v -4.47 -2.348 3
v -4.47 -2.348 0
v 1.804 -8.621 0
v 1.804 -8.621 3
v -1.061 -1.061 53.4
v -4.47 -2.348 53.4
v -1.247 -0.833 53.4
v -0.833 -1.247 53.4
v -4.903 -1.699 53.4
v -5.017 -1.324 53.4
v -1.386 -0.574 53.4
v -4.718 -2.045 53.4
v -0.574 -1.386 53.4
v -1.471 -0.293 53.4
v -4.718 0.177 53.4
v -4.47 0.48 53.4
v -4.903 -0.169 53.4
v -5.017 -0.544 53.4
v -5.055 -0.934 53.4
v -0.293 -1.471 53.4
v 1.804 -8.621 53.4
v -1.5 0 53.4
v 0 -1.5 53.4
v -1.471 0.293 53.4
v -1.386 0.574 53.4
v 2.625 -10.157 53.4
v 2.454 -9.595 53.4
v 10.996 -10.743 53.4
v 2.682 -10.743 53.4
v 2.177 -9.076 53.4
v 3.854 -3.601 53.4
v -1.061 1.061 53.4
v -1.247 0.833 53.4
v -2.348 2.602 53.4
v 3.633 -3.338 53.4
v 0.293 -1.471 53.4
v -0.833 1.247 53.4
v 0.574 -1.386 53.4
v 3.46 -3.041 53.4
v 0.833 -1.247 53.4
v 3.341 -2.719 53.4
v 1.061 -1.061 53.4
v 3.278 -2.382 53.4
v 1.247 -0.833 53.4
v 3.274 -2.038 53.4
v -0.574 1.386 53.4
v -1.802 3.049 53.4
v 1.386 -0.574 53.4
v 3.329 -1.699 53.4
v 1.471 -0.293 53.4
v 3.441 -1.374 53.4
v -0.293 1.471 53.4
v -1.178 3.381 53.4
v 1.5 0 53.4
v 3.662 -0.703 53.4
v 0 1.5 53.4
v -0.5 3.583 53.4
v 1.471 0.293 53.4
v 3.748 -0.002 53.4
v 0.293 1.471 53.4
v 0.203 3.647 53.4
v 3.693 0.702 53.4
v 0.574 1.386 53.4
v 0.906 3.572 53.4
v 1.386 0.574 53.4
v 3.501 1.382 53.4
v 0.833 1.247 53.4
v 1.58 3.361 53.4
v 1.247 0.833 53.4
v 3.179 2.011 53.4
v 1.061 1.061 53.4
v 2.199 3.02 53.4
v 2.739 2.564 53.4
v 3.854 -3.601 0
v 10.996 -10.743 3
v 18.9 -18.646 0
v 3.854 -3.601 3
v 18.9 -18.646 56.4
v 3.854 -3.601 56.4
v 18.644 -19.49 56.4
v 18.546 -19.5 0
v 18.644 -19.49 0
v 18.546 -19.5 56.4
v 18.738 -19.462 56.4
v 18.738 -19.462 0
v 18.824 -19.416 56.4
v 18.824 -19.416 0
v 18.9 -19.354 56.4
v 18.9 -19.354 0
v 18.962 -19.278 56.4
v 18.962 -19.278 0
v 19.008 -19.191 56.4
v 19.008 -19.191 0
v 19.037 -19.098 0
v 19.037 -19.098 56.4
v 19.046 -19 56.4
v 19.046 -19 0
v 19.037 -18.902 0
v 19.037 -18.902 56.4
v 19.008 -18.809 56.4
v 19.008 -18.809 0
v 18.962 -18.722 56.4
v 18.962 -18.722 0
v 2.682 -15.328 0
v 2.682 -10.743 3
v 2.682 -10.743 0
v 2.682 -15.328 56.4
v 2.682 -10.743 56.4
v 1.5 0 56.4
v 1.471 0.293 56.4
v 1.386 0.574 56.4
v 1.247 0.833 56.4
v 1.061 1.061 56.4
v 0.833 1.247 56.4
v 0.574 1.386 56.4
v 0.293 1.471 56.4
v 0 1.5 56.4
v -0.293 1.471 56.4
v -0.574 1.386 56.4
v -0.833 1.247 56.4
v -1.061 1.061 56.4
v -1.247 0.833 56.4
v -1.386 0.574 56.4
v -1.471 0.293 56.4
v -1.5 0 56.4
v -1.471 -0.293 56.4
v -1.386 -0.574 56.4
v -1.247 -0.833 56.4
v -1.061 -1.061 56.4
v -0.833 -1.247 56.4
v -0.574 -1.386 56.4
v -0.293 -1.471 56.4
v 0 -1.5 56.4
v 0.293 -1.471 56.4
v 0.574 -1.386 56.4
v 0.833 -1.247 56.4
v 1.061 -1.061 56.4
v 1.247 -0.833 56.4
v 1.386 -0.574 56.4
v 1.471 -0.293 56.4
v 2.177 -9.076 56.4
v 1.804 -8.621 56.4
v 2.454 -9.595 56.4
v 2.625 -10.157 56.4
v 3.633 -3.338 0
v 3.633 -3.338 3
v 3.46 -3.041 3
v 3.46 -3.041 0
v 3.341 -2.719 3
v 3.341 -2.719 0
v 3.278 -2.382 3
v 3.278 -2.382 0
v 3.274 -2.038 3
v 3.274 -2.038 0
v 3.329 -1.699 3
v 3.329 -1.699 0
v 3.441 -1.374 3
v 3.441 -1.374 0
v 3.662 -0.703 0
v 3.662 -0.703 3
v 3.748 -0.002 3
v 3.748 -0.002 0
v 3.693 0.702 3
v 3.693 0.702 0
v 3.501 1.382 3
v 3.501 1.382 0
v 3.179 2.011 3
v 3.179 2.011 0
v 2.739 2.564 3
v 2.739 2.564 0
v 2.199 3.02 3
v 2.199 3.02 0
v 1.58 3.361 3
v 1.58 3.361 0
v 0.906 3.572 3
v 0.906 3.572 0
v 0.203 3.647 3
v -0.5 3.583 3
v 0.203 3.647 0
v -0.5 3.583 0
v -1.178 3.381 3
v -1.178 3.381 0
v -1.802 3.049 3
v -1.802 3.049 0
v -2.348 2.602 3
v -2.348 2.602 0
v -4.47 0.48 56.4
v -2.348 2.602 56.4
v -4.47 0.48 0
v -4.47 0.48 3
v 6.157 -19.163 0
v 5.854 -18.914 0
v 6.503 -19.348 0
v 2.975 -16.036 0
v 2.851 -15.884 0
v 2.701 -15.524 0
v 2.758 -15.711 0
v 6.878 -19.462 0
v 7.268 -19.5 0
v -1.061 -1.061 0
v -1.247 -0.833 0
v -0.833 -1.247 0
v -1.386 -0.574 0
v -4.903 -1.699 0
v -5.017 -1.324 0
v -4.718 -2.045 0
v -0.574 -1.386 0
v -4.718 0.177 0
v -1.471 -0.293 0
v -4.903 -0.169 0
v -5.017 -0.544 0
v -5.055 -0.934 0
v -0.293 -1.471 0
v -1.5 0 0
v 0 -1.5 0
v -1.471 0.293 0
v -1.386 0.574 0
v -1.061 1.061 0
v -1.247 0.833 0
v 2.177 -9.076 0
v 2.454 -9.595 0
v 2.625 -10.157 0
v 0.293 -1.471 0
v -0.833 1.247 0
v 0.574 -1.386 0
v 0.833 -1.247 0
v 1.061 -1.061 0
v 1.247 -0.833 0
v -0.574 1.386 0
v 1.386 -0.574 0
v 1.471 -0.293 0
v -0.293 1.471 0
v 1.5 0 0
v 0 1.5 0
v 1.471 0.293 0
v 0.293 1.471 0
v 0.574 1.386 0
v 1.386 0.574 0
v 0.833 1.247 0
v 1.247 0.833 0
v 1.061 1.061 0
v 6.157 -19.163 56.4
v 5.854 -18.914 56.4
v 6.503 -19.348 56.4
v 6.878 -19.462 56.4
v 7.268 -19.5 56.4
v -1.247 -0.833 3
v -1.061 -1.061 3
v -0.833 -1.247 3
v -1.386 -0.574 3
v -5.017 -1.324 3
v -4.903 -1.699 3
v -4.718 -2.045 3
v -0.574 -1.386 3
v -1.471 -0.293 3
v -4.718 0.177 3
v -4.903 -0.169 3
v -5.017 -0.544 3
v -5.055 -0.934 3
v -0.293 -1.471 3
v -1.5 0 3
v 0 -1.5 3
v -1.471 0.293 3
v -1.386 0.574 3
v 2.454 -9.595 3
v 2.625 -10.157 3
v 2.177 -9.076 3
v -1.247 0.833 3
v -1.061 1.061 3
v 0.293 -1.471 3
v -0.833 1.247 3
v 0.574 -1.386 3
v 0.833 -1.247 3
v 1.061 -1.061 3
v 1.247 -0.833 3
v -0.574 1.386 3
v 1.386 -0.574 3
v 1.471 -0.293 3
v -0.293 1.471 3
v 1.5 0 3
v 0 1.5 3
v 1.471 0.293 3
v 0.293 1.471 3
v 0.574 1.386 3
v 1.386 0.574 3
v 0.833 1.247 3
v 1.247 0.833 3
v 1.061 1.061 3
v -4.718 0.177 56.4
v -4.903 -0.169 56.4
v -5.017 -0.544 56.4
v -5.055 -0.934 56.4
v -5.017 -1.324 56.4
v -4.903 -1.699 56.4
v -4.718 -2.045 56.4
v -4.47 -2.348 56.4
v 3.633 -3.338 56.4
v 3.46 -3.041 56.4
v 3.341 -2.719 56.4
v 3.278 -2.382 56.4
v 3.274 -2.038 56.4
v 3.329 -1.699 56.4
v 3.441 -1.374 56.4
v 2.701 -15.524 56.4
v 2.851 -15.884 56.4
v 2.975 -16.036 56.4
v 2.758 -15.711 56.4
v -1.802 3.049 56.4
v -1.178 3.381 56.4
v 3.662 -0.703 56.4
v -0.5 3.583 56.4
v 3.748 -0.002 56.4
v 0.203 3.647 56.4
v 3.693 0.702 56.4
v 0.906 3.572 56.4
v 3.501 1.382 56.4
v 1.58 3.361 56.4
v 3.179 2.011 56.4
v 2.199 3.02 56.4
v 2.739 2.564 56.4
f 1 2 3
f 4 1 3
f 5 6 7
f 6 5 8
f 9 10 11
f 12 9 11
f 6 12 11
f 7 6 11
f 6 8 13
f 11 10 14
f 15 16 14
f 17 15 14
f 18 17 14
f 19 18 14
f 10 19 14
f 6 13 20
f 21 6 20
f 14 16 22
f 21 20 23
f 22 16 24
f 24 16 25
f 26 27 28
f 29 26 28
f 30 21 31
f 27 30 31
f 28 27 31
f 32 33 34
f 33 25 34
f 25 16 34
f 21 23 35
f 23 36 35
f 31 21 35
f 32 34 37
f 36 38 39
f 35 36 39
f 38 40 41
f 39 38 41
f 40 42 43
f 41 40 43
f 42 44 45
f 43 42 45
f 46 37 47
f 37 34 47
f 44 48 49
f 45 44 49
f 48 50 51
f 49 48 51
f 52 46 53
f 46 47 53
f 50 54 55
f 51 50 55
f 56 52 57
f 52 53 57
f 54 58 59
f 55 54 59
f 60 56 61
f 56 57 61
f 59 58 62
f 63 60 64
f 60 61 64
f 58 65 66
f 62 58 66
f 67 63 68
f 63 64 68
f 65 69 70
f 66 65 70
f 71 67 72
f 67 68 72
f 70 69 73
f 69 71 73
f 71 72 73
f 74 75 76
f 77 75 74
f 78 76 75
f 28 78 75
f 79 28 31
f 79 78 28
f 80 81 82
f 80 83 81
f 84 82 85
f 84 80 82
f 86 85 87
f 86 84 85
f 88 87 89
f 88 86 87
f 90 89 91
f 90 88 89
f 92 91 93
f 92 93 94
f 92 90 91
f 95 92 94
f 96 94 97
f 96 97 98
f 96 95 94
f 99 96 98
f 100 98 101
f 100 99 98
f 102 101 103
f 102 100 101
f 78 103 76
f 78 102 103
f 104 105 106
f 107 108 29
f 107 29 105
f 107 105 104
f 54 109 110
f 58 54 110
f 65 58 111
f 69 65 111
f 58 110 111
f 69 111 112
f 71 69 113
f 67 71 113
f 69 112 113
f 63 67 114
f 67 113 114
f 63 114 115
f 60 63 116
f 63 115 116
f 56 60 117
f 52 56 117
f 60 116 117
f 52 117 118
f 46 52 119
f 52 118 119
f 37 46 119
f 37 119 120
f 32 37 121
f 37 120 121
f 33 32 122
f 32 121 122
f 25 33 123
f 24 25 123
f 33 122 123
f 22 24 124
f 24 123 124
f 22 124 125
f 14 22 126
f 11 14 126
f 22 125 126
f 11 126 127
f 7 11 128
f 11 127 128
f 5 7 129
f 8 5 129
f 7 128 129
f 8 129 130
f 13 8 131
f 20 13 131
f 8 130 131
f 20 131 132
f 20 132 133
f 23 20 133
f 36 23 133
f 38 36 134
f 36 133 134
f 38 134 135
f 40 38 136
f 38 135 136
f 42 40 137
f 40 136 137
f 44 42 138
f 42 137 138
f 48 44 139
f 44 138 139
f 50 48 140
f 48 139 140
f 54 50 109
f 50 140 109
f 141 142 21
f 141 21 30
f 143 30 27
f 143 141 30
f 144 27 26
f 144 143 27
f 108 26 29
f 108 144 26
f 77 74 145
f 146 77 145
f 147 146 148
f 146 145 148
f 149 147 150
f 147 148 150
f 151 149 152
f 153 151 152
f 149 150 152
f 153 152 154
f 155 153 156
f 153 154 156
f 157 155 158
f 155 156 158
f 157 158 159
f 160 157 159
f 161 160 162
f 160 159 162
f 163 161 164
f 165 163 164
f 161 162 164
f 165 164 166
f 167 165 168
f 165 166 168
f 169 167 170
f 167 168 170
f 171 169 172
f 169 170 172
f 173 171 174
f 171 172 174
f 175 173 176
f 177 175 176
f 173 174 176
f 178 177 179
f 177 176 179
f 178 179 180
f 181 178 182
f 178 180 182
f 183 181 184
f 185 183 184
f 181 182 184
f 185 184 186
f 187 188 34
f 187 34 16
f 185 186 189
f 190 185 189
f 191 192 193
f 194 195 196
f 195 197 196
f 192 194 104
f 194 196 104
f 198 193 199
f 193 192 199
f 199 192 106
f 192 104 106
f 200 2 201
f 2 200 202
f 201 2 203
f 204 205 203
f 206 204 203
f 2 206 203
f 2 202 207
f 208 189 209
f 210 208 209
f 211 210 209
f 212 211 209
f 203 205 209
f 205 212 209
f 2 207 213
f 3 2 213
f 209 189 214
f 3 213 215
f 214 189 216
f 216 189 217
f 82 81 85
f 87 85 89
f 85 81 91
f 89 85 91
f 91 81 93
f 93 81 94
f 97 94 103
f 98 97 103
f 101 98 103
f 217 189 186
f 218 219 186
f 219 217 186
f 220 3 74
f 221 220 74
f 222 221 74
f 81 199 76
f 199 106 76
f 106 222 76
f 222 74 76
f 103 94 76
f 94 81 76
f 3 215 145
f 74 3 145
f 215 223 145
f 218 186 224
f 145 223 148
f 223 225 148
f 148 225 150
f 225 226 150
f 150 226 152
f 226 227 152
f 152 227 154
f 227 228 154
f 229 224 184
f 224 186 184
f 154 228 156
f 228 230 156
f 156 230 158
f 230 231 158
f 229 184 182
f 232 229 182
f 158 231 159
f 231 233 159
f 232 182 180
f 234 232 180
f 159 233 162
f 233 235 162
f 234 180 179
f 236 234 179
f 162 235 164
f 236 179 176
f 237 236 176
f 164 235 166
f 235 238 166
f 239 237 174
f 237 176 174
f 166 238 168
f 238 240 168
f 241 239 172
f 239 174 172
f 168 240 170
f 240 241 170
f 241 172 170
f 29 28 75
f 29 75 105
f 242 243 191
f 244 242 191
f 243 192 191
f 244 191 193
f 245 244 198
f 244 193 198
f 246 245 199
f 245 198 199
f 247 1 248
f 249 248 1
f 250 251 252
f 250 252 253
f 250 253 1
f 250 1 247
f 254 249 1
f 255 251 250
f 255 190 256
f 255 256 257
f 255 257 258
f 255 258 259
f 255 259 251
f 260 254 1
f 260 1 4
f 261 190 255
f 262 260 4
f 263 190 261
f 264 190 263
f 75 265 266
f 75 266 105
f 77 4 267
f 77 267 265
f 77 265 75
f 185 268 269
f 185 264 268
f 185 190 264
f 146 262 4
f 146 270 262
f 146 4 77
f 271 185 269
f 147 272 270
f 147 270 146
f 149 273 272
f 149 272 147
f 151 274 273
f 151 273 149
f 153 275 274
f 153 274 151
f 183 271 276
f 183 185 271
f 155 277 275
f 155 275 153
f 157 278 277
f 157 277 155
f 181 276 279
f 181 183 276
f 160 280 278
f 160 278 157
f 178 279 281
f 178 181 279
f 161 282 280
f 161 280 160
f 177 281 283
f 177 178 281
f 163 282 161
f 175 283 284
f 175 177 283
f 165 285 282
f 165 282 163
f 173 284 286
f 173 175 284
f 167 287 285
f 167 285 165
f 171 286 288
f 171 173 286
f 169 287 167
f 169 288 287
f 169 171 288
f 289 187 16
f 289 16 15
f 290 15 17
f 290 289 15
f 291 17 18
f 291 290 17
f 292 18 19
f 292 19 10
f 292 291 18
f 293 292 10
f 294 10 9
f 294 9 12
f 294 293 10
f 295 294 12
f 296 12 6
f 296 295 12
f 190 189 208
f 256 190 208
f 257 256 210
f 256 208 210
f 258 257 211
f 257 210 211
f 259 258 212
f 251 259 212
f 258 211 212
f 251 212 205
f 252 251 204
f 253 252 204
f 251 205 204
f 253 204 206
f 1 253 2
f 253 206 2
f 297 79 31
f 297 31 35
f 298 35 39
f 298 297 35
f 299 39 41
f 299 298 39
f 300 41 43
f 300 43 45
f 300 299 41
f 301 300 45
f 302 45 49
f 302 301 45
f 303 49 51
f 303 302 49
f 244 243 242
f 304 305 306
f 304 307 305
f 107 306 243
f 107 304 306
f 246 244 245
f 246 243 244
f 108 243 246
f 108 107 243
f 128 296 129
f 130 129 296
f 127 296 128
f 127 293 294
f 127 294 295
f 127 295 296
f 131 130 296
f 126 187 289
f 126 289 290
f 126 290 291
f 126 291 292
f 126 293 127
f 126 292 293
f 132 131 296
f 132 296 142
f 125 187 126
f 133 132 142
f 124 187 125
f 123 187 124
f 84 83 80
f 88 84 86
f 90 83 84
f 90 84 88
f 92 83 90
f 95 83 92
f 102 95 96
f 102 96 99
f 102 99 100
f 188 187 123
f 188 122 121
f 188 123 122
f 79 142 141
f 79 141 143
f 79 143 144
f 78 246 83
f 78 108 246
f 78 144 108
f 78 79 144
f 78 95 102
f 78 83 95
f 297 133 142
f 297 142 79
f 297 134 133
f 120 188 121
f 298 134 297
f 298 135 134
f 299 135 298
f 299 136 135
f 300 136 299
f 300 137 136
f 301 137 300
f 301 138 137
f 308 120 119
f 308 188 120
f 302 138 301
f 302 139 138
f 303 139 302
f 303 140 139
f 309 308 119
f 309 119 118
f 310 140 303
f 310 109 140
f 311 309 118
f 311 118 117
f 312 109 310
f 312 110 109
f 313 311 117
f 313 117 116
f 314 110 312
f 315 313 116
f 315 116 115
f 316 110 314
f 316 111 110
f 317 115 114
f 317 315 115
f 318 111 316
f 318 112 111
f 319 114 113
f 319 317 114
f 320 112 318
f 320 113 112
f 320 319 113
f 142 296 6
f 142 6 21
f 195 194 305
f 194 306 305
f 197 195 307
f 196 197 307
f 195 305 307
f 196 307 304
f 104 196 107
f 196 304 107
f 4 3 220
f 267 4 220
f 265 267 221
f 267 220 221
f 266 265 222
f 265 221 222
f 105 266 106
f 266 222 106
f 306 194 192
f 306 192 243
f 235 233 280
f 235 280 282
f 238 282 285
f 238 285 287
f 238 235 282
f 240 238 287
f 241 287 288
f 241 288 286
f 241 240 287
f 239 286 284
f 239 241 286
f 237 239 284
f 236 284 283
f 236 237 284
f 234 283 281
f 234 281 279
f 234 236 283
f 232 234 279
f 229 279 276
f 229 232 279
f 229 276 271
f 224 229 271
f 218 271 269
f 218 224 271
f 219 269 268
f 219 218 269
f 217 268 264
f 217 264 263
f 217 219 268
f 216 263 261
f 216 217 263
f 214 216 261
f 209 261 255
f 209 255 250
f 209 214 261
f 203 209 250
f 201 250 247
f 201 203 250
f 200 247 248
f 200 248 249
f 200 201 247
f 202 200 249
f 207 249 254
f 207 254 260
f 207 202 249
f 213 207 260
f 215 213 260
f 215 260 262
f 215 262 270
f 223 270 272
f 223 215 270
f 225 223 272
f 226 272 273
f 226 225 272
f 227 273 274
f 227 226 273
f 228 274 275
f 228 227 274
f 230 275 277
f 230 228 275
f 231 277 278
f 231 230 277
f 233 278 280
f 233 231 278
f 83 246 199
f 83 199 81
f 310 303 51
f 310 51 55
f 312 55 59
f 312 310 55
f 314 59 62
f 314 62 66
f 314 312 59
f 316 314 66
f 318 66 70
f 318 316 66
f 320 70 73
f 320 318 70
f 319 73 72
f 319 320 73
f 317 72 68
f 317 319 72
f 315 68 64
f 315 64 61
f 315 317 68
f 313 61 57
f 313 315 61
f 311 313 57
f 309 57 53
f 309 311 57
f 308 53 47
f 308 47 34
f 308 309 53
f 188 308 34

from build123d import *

# Parameters (mm, degrees)
SKETCH1_R           = 1.5
BOSS_EXTRUDE1_DEPTH = 3
BOSS_EXTRUDE2_DEPTH = 25.2
SKETCH6_W           = 57.536590271
SKETCH6_H           = 9.11547301
CUT_EXTRUDE1_DEPTH  = 64.271846515
FILLET1_R           = 2
FILLET2_R           = 1


with BuildPart() as part:
    # Sketch1 → Boss-Extrude1 (new body)
    with BuildSketch(Plane.XY):
        with BuildLine():
            Line((3.68220241, -19.5), (18.54616344, -19.5))
            ThreePointArc((18.54616344, -19.5), (19.008103207, -19.191341716), (18.899716831, -18.646446609))
            Line((18.899716831, -18.646446609), (3.854153503, -3.600883281))
            ThreePointArc((3.854153503, -3.600883281), (3.30197574, -2.551779506), (3.440748076, -1.374383543))
            ThreePointArc((3.440748076, -1.374383543), (2.199066013, 3.02009221), (-2.348238623, 2.601508845))
            Line((-2.348238623, 2.601508845), (-4.469558967, 0.480188501))
            ThreePointArc((-4.469558967, 0.480188501), (-5.055345405, -0.934025061), (-4.469558967, -2.348238623))
            Line((-4.469558967, -2.348238623), (1.803522753, -8.621320344))
            ThreePointArc((1.803522753, -8.621320344), (2.453841007, -9.59459039), (2.68220241, -10.742640687))
            Line((2.68220241, -10.742640687), (2.68220241, -18.5))
            ThreePointArc((2.68220241, -18.5), (2.975095629, -19.207106781), (3.68220241, -19.5))
        make_face()
        Circle(SKETCH1_R, mode=Mode.SUBTRACT)
    boss_extrude1 = extrude(amount=BOSS_EXTRUDE1_DEPTH)

    # Sketch2 → Boss-Extrude2 (add)
    with BuildSketch(Plane.XY.offset(3)):
        with BuildLine():
            Line((18.899716831, -18.646446609), (10.995910909, -10.742640687))
            Line((10.995910909, -10.742640687), (2.68220241, -10.742640687))
            Line((2.68220241, -10.742640687), (2.68220241, -18.5))
            ThreePointArc((2.68220241, -18.5), (2.975095629, -19.207106781), (3.68220241, -19.5))
            Line((3.68220241, -19.5), (18.54616344, -19.5))
            ThreePointArc((18.54616344, -19.5), (19.008103207, -19.191341716), (18.899716831, -18.646446609))
        make_face()
    boss_extrude2 = extrude(amount=BOSS_EXTRUDE2_DEPTH)

    # Mirror1: Boss-Extrude1, Boss-Extrude2 across plane
    add(boss_extrude1.mirror(Plane.XY.offset(28.2)))
    add(boss_extrude2.mirror(Plane.XY.offset(28.2)))

    # Sketch6 → Cut-Extrude1 (cut, through all)
    with BuildSketch(Plane(origin=(-6.530219139, -6.530219139, 0), x_dir=(0, 0, 1), z_dir=(-0.7071067811865487, -0.7071067811865465, 0))):
        with Locations((27.631704865, -17.586068001)):
            Rectangle(SKETCH6_W, SKETCH6_H)
    extrude(amount=CUT_EXTRUDE1_DEPTH, mode=Mode.SUBTRACT)

    # Fillet1
    fillet1_edges = [part.edges().sort_by_distance(p)[0] for p in [
        (6.439561723, -19.5, 28.2),
    ]]
    fillet(fillet1_edges, radius=FILLET1_R)

    # Fillet2
    fillet2_edges = [part.edges().sort_by_distance(p)[0] for p in [
        (2.68220241, -15.742640687, 28.2),
    ]]
    fillet(fillet2_edges, radius=FILLET2_R)


solid = part.part
